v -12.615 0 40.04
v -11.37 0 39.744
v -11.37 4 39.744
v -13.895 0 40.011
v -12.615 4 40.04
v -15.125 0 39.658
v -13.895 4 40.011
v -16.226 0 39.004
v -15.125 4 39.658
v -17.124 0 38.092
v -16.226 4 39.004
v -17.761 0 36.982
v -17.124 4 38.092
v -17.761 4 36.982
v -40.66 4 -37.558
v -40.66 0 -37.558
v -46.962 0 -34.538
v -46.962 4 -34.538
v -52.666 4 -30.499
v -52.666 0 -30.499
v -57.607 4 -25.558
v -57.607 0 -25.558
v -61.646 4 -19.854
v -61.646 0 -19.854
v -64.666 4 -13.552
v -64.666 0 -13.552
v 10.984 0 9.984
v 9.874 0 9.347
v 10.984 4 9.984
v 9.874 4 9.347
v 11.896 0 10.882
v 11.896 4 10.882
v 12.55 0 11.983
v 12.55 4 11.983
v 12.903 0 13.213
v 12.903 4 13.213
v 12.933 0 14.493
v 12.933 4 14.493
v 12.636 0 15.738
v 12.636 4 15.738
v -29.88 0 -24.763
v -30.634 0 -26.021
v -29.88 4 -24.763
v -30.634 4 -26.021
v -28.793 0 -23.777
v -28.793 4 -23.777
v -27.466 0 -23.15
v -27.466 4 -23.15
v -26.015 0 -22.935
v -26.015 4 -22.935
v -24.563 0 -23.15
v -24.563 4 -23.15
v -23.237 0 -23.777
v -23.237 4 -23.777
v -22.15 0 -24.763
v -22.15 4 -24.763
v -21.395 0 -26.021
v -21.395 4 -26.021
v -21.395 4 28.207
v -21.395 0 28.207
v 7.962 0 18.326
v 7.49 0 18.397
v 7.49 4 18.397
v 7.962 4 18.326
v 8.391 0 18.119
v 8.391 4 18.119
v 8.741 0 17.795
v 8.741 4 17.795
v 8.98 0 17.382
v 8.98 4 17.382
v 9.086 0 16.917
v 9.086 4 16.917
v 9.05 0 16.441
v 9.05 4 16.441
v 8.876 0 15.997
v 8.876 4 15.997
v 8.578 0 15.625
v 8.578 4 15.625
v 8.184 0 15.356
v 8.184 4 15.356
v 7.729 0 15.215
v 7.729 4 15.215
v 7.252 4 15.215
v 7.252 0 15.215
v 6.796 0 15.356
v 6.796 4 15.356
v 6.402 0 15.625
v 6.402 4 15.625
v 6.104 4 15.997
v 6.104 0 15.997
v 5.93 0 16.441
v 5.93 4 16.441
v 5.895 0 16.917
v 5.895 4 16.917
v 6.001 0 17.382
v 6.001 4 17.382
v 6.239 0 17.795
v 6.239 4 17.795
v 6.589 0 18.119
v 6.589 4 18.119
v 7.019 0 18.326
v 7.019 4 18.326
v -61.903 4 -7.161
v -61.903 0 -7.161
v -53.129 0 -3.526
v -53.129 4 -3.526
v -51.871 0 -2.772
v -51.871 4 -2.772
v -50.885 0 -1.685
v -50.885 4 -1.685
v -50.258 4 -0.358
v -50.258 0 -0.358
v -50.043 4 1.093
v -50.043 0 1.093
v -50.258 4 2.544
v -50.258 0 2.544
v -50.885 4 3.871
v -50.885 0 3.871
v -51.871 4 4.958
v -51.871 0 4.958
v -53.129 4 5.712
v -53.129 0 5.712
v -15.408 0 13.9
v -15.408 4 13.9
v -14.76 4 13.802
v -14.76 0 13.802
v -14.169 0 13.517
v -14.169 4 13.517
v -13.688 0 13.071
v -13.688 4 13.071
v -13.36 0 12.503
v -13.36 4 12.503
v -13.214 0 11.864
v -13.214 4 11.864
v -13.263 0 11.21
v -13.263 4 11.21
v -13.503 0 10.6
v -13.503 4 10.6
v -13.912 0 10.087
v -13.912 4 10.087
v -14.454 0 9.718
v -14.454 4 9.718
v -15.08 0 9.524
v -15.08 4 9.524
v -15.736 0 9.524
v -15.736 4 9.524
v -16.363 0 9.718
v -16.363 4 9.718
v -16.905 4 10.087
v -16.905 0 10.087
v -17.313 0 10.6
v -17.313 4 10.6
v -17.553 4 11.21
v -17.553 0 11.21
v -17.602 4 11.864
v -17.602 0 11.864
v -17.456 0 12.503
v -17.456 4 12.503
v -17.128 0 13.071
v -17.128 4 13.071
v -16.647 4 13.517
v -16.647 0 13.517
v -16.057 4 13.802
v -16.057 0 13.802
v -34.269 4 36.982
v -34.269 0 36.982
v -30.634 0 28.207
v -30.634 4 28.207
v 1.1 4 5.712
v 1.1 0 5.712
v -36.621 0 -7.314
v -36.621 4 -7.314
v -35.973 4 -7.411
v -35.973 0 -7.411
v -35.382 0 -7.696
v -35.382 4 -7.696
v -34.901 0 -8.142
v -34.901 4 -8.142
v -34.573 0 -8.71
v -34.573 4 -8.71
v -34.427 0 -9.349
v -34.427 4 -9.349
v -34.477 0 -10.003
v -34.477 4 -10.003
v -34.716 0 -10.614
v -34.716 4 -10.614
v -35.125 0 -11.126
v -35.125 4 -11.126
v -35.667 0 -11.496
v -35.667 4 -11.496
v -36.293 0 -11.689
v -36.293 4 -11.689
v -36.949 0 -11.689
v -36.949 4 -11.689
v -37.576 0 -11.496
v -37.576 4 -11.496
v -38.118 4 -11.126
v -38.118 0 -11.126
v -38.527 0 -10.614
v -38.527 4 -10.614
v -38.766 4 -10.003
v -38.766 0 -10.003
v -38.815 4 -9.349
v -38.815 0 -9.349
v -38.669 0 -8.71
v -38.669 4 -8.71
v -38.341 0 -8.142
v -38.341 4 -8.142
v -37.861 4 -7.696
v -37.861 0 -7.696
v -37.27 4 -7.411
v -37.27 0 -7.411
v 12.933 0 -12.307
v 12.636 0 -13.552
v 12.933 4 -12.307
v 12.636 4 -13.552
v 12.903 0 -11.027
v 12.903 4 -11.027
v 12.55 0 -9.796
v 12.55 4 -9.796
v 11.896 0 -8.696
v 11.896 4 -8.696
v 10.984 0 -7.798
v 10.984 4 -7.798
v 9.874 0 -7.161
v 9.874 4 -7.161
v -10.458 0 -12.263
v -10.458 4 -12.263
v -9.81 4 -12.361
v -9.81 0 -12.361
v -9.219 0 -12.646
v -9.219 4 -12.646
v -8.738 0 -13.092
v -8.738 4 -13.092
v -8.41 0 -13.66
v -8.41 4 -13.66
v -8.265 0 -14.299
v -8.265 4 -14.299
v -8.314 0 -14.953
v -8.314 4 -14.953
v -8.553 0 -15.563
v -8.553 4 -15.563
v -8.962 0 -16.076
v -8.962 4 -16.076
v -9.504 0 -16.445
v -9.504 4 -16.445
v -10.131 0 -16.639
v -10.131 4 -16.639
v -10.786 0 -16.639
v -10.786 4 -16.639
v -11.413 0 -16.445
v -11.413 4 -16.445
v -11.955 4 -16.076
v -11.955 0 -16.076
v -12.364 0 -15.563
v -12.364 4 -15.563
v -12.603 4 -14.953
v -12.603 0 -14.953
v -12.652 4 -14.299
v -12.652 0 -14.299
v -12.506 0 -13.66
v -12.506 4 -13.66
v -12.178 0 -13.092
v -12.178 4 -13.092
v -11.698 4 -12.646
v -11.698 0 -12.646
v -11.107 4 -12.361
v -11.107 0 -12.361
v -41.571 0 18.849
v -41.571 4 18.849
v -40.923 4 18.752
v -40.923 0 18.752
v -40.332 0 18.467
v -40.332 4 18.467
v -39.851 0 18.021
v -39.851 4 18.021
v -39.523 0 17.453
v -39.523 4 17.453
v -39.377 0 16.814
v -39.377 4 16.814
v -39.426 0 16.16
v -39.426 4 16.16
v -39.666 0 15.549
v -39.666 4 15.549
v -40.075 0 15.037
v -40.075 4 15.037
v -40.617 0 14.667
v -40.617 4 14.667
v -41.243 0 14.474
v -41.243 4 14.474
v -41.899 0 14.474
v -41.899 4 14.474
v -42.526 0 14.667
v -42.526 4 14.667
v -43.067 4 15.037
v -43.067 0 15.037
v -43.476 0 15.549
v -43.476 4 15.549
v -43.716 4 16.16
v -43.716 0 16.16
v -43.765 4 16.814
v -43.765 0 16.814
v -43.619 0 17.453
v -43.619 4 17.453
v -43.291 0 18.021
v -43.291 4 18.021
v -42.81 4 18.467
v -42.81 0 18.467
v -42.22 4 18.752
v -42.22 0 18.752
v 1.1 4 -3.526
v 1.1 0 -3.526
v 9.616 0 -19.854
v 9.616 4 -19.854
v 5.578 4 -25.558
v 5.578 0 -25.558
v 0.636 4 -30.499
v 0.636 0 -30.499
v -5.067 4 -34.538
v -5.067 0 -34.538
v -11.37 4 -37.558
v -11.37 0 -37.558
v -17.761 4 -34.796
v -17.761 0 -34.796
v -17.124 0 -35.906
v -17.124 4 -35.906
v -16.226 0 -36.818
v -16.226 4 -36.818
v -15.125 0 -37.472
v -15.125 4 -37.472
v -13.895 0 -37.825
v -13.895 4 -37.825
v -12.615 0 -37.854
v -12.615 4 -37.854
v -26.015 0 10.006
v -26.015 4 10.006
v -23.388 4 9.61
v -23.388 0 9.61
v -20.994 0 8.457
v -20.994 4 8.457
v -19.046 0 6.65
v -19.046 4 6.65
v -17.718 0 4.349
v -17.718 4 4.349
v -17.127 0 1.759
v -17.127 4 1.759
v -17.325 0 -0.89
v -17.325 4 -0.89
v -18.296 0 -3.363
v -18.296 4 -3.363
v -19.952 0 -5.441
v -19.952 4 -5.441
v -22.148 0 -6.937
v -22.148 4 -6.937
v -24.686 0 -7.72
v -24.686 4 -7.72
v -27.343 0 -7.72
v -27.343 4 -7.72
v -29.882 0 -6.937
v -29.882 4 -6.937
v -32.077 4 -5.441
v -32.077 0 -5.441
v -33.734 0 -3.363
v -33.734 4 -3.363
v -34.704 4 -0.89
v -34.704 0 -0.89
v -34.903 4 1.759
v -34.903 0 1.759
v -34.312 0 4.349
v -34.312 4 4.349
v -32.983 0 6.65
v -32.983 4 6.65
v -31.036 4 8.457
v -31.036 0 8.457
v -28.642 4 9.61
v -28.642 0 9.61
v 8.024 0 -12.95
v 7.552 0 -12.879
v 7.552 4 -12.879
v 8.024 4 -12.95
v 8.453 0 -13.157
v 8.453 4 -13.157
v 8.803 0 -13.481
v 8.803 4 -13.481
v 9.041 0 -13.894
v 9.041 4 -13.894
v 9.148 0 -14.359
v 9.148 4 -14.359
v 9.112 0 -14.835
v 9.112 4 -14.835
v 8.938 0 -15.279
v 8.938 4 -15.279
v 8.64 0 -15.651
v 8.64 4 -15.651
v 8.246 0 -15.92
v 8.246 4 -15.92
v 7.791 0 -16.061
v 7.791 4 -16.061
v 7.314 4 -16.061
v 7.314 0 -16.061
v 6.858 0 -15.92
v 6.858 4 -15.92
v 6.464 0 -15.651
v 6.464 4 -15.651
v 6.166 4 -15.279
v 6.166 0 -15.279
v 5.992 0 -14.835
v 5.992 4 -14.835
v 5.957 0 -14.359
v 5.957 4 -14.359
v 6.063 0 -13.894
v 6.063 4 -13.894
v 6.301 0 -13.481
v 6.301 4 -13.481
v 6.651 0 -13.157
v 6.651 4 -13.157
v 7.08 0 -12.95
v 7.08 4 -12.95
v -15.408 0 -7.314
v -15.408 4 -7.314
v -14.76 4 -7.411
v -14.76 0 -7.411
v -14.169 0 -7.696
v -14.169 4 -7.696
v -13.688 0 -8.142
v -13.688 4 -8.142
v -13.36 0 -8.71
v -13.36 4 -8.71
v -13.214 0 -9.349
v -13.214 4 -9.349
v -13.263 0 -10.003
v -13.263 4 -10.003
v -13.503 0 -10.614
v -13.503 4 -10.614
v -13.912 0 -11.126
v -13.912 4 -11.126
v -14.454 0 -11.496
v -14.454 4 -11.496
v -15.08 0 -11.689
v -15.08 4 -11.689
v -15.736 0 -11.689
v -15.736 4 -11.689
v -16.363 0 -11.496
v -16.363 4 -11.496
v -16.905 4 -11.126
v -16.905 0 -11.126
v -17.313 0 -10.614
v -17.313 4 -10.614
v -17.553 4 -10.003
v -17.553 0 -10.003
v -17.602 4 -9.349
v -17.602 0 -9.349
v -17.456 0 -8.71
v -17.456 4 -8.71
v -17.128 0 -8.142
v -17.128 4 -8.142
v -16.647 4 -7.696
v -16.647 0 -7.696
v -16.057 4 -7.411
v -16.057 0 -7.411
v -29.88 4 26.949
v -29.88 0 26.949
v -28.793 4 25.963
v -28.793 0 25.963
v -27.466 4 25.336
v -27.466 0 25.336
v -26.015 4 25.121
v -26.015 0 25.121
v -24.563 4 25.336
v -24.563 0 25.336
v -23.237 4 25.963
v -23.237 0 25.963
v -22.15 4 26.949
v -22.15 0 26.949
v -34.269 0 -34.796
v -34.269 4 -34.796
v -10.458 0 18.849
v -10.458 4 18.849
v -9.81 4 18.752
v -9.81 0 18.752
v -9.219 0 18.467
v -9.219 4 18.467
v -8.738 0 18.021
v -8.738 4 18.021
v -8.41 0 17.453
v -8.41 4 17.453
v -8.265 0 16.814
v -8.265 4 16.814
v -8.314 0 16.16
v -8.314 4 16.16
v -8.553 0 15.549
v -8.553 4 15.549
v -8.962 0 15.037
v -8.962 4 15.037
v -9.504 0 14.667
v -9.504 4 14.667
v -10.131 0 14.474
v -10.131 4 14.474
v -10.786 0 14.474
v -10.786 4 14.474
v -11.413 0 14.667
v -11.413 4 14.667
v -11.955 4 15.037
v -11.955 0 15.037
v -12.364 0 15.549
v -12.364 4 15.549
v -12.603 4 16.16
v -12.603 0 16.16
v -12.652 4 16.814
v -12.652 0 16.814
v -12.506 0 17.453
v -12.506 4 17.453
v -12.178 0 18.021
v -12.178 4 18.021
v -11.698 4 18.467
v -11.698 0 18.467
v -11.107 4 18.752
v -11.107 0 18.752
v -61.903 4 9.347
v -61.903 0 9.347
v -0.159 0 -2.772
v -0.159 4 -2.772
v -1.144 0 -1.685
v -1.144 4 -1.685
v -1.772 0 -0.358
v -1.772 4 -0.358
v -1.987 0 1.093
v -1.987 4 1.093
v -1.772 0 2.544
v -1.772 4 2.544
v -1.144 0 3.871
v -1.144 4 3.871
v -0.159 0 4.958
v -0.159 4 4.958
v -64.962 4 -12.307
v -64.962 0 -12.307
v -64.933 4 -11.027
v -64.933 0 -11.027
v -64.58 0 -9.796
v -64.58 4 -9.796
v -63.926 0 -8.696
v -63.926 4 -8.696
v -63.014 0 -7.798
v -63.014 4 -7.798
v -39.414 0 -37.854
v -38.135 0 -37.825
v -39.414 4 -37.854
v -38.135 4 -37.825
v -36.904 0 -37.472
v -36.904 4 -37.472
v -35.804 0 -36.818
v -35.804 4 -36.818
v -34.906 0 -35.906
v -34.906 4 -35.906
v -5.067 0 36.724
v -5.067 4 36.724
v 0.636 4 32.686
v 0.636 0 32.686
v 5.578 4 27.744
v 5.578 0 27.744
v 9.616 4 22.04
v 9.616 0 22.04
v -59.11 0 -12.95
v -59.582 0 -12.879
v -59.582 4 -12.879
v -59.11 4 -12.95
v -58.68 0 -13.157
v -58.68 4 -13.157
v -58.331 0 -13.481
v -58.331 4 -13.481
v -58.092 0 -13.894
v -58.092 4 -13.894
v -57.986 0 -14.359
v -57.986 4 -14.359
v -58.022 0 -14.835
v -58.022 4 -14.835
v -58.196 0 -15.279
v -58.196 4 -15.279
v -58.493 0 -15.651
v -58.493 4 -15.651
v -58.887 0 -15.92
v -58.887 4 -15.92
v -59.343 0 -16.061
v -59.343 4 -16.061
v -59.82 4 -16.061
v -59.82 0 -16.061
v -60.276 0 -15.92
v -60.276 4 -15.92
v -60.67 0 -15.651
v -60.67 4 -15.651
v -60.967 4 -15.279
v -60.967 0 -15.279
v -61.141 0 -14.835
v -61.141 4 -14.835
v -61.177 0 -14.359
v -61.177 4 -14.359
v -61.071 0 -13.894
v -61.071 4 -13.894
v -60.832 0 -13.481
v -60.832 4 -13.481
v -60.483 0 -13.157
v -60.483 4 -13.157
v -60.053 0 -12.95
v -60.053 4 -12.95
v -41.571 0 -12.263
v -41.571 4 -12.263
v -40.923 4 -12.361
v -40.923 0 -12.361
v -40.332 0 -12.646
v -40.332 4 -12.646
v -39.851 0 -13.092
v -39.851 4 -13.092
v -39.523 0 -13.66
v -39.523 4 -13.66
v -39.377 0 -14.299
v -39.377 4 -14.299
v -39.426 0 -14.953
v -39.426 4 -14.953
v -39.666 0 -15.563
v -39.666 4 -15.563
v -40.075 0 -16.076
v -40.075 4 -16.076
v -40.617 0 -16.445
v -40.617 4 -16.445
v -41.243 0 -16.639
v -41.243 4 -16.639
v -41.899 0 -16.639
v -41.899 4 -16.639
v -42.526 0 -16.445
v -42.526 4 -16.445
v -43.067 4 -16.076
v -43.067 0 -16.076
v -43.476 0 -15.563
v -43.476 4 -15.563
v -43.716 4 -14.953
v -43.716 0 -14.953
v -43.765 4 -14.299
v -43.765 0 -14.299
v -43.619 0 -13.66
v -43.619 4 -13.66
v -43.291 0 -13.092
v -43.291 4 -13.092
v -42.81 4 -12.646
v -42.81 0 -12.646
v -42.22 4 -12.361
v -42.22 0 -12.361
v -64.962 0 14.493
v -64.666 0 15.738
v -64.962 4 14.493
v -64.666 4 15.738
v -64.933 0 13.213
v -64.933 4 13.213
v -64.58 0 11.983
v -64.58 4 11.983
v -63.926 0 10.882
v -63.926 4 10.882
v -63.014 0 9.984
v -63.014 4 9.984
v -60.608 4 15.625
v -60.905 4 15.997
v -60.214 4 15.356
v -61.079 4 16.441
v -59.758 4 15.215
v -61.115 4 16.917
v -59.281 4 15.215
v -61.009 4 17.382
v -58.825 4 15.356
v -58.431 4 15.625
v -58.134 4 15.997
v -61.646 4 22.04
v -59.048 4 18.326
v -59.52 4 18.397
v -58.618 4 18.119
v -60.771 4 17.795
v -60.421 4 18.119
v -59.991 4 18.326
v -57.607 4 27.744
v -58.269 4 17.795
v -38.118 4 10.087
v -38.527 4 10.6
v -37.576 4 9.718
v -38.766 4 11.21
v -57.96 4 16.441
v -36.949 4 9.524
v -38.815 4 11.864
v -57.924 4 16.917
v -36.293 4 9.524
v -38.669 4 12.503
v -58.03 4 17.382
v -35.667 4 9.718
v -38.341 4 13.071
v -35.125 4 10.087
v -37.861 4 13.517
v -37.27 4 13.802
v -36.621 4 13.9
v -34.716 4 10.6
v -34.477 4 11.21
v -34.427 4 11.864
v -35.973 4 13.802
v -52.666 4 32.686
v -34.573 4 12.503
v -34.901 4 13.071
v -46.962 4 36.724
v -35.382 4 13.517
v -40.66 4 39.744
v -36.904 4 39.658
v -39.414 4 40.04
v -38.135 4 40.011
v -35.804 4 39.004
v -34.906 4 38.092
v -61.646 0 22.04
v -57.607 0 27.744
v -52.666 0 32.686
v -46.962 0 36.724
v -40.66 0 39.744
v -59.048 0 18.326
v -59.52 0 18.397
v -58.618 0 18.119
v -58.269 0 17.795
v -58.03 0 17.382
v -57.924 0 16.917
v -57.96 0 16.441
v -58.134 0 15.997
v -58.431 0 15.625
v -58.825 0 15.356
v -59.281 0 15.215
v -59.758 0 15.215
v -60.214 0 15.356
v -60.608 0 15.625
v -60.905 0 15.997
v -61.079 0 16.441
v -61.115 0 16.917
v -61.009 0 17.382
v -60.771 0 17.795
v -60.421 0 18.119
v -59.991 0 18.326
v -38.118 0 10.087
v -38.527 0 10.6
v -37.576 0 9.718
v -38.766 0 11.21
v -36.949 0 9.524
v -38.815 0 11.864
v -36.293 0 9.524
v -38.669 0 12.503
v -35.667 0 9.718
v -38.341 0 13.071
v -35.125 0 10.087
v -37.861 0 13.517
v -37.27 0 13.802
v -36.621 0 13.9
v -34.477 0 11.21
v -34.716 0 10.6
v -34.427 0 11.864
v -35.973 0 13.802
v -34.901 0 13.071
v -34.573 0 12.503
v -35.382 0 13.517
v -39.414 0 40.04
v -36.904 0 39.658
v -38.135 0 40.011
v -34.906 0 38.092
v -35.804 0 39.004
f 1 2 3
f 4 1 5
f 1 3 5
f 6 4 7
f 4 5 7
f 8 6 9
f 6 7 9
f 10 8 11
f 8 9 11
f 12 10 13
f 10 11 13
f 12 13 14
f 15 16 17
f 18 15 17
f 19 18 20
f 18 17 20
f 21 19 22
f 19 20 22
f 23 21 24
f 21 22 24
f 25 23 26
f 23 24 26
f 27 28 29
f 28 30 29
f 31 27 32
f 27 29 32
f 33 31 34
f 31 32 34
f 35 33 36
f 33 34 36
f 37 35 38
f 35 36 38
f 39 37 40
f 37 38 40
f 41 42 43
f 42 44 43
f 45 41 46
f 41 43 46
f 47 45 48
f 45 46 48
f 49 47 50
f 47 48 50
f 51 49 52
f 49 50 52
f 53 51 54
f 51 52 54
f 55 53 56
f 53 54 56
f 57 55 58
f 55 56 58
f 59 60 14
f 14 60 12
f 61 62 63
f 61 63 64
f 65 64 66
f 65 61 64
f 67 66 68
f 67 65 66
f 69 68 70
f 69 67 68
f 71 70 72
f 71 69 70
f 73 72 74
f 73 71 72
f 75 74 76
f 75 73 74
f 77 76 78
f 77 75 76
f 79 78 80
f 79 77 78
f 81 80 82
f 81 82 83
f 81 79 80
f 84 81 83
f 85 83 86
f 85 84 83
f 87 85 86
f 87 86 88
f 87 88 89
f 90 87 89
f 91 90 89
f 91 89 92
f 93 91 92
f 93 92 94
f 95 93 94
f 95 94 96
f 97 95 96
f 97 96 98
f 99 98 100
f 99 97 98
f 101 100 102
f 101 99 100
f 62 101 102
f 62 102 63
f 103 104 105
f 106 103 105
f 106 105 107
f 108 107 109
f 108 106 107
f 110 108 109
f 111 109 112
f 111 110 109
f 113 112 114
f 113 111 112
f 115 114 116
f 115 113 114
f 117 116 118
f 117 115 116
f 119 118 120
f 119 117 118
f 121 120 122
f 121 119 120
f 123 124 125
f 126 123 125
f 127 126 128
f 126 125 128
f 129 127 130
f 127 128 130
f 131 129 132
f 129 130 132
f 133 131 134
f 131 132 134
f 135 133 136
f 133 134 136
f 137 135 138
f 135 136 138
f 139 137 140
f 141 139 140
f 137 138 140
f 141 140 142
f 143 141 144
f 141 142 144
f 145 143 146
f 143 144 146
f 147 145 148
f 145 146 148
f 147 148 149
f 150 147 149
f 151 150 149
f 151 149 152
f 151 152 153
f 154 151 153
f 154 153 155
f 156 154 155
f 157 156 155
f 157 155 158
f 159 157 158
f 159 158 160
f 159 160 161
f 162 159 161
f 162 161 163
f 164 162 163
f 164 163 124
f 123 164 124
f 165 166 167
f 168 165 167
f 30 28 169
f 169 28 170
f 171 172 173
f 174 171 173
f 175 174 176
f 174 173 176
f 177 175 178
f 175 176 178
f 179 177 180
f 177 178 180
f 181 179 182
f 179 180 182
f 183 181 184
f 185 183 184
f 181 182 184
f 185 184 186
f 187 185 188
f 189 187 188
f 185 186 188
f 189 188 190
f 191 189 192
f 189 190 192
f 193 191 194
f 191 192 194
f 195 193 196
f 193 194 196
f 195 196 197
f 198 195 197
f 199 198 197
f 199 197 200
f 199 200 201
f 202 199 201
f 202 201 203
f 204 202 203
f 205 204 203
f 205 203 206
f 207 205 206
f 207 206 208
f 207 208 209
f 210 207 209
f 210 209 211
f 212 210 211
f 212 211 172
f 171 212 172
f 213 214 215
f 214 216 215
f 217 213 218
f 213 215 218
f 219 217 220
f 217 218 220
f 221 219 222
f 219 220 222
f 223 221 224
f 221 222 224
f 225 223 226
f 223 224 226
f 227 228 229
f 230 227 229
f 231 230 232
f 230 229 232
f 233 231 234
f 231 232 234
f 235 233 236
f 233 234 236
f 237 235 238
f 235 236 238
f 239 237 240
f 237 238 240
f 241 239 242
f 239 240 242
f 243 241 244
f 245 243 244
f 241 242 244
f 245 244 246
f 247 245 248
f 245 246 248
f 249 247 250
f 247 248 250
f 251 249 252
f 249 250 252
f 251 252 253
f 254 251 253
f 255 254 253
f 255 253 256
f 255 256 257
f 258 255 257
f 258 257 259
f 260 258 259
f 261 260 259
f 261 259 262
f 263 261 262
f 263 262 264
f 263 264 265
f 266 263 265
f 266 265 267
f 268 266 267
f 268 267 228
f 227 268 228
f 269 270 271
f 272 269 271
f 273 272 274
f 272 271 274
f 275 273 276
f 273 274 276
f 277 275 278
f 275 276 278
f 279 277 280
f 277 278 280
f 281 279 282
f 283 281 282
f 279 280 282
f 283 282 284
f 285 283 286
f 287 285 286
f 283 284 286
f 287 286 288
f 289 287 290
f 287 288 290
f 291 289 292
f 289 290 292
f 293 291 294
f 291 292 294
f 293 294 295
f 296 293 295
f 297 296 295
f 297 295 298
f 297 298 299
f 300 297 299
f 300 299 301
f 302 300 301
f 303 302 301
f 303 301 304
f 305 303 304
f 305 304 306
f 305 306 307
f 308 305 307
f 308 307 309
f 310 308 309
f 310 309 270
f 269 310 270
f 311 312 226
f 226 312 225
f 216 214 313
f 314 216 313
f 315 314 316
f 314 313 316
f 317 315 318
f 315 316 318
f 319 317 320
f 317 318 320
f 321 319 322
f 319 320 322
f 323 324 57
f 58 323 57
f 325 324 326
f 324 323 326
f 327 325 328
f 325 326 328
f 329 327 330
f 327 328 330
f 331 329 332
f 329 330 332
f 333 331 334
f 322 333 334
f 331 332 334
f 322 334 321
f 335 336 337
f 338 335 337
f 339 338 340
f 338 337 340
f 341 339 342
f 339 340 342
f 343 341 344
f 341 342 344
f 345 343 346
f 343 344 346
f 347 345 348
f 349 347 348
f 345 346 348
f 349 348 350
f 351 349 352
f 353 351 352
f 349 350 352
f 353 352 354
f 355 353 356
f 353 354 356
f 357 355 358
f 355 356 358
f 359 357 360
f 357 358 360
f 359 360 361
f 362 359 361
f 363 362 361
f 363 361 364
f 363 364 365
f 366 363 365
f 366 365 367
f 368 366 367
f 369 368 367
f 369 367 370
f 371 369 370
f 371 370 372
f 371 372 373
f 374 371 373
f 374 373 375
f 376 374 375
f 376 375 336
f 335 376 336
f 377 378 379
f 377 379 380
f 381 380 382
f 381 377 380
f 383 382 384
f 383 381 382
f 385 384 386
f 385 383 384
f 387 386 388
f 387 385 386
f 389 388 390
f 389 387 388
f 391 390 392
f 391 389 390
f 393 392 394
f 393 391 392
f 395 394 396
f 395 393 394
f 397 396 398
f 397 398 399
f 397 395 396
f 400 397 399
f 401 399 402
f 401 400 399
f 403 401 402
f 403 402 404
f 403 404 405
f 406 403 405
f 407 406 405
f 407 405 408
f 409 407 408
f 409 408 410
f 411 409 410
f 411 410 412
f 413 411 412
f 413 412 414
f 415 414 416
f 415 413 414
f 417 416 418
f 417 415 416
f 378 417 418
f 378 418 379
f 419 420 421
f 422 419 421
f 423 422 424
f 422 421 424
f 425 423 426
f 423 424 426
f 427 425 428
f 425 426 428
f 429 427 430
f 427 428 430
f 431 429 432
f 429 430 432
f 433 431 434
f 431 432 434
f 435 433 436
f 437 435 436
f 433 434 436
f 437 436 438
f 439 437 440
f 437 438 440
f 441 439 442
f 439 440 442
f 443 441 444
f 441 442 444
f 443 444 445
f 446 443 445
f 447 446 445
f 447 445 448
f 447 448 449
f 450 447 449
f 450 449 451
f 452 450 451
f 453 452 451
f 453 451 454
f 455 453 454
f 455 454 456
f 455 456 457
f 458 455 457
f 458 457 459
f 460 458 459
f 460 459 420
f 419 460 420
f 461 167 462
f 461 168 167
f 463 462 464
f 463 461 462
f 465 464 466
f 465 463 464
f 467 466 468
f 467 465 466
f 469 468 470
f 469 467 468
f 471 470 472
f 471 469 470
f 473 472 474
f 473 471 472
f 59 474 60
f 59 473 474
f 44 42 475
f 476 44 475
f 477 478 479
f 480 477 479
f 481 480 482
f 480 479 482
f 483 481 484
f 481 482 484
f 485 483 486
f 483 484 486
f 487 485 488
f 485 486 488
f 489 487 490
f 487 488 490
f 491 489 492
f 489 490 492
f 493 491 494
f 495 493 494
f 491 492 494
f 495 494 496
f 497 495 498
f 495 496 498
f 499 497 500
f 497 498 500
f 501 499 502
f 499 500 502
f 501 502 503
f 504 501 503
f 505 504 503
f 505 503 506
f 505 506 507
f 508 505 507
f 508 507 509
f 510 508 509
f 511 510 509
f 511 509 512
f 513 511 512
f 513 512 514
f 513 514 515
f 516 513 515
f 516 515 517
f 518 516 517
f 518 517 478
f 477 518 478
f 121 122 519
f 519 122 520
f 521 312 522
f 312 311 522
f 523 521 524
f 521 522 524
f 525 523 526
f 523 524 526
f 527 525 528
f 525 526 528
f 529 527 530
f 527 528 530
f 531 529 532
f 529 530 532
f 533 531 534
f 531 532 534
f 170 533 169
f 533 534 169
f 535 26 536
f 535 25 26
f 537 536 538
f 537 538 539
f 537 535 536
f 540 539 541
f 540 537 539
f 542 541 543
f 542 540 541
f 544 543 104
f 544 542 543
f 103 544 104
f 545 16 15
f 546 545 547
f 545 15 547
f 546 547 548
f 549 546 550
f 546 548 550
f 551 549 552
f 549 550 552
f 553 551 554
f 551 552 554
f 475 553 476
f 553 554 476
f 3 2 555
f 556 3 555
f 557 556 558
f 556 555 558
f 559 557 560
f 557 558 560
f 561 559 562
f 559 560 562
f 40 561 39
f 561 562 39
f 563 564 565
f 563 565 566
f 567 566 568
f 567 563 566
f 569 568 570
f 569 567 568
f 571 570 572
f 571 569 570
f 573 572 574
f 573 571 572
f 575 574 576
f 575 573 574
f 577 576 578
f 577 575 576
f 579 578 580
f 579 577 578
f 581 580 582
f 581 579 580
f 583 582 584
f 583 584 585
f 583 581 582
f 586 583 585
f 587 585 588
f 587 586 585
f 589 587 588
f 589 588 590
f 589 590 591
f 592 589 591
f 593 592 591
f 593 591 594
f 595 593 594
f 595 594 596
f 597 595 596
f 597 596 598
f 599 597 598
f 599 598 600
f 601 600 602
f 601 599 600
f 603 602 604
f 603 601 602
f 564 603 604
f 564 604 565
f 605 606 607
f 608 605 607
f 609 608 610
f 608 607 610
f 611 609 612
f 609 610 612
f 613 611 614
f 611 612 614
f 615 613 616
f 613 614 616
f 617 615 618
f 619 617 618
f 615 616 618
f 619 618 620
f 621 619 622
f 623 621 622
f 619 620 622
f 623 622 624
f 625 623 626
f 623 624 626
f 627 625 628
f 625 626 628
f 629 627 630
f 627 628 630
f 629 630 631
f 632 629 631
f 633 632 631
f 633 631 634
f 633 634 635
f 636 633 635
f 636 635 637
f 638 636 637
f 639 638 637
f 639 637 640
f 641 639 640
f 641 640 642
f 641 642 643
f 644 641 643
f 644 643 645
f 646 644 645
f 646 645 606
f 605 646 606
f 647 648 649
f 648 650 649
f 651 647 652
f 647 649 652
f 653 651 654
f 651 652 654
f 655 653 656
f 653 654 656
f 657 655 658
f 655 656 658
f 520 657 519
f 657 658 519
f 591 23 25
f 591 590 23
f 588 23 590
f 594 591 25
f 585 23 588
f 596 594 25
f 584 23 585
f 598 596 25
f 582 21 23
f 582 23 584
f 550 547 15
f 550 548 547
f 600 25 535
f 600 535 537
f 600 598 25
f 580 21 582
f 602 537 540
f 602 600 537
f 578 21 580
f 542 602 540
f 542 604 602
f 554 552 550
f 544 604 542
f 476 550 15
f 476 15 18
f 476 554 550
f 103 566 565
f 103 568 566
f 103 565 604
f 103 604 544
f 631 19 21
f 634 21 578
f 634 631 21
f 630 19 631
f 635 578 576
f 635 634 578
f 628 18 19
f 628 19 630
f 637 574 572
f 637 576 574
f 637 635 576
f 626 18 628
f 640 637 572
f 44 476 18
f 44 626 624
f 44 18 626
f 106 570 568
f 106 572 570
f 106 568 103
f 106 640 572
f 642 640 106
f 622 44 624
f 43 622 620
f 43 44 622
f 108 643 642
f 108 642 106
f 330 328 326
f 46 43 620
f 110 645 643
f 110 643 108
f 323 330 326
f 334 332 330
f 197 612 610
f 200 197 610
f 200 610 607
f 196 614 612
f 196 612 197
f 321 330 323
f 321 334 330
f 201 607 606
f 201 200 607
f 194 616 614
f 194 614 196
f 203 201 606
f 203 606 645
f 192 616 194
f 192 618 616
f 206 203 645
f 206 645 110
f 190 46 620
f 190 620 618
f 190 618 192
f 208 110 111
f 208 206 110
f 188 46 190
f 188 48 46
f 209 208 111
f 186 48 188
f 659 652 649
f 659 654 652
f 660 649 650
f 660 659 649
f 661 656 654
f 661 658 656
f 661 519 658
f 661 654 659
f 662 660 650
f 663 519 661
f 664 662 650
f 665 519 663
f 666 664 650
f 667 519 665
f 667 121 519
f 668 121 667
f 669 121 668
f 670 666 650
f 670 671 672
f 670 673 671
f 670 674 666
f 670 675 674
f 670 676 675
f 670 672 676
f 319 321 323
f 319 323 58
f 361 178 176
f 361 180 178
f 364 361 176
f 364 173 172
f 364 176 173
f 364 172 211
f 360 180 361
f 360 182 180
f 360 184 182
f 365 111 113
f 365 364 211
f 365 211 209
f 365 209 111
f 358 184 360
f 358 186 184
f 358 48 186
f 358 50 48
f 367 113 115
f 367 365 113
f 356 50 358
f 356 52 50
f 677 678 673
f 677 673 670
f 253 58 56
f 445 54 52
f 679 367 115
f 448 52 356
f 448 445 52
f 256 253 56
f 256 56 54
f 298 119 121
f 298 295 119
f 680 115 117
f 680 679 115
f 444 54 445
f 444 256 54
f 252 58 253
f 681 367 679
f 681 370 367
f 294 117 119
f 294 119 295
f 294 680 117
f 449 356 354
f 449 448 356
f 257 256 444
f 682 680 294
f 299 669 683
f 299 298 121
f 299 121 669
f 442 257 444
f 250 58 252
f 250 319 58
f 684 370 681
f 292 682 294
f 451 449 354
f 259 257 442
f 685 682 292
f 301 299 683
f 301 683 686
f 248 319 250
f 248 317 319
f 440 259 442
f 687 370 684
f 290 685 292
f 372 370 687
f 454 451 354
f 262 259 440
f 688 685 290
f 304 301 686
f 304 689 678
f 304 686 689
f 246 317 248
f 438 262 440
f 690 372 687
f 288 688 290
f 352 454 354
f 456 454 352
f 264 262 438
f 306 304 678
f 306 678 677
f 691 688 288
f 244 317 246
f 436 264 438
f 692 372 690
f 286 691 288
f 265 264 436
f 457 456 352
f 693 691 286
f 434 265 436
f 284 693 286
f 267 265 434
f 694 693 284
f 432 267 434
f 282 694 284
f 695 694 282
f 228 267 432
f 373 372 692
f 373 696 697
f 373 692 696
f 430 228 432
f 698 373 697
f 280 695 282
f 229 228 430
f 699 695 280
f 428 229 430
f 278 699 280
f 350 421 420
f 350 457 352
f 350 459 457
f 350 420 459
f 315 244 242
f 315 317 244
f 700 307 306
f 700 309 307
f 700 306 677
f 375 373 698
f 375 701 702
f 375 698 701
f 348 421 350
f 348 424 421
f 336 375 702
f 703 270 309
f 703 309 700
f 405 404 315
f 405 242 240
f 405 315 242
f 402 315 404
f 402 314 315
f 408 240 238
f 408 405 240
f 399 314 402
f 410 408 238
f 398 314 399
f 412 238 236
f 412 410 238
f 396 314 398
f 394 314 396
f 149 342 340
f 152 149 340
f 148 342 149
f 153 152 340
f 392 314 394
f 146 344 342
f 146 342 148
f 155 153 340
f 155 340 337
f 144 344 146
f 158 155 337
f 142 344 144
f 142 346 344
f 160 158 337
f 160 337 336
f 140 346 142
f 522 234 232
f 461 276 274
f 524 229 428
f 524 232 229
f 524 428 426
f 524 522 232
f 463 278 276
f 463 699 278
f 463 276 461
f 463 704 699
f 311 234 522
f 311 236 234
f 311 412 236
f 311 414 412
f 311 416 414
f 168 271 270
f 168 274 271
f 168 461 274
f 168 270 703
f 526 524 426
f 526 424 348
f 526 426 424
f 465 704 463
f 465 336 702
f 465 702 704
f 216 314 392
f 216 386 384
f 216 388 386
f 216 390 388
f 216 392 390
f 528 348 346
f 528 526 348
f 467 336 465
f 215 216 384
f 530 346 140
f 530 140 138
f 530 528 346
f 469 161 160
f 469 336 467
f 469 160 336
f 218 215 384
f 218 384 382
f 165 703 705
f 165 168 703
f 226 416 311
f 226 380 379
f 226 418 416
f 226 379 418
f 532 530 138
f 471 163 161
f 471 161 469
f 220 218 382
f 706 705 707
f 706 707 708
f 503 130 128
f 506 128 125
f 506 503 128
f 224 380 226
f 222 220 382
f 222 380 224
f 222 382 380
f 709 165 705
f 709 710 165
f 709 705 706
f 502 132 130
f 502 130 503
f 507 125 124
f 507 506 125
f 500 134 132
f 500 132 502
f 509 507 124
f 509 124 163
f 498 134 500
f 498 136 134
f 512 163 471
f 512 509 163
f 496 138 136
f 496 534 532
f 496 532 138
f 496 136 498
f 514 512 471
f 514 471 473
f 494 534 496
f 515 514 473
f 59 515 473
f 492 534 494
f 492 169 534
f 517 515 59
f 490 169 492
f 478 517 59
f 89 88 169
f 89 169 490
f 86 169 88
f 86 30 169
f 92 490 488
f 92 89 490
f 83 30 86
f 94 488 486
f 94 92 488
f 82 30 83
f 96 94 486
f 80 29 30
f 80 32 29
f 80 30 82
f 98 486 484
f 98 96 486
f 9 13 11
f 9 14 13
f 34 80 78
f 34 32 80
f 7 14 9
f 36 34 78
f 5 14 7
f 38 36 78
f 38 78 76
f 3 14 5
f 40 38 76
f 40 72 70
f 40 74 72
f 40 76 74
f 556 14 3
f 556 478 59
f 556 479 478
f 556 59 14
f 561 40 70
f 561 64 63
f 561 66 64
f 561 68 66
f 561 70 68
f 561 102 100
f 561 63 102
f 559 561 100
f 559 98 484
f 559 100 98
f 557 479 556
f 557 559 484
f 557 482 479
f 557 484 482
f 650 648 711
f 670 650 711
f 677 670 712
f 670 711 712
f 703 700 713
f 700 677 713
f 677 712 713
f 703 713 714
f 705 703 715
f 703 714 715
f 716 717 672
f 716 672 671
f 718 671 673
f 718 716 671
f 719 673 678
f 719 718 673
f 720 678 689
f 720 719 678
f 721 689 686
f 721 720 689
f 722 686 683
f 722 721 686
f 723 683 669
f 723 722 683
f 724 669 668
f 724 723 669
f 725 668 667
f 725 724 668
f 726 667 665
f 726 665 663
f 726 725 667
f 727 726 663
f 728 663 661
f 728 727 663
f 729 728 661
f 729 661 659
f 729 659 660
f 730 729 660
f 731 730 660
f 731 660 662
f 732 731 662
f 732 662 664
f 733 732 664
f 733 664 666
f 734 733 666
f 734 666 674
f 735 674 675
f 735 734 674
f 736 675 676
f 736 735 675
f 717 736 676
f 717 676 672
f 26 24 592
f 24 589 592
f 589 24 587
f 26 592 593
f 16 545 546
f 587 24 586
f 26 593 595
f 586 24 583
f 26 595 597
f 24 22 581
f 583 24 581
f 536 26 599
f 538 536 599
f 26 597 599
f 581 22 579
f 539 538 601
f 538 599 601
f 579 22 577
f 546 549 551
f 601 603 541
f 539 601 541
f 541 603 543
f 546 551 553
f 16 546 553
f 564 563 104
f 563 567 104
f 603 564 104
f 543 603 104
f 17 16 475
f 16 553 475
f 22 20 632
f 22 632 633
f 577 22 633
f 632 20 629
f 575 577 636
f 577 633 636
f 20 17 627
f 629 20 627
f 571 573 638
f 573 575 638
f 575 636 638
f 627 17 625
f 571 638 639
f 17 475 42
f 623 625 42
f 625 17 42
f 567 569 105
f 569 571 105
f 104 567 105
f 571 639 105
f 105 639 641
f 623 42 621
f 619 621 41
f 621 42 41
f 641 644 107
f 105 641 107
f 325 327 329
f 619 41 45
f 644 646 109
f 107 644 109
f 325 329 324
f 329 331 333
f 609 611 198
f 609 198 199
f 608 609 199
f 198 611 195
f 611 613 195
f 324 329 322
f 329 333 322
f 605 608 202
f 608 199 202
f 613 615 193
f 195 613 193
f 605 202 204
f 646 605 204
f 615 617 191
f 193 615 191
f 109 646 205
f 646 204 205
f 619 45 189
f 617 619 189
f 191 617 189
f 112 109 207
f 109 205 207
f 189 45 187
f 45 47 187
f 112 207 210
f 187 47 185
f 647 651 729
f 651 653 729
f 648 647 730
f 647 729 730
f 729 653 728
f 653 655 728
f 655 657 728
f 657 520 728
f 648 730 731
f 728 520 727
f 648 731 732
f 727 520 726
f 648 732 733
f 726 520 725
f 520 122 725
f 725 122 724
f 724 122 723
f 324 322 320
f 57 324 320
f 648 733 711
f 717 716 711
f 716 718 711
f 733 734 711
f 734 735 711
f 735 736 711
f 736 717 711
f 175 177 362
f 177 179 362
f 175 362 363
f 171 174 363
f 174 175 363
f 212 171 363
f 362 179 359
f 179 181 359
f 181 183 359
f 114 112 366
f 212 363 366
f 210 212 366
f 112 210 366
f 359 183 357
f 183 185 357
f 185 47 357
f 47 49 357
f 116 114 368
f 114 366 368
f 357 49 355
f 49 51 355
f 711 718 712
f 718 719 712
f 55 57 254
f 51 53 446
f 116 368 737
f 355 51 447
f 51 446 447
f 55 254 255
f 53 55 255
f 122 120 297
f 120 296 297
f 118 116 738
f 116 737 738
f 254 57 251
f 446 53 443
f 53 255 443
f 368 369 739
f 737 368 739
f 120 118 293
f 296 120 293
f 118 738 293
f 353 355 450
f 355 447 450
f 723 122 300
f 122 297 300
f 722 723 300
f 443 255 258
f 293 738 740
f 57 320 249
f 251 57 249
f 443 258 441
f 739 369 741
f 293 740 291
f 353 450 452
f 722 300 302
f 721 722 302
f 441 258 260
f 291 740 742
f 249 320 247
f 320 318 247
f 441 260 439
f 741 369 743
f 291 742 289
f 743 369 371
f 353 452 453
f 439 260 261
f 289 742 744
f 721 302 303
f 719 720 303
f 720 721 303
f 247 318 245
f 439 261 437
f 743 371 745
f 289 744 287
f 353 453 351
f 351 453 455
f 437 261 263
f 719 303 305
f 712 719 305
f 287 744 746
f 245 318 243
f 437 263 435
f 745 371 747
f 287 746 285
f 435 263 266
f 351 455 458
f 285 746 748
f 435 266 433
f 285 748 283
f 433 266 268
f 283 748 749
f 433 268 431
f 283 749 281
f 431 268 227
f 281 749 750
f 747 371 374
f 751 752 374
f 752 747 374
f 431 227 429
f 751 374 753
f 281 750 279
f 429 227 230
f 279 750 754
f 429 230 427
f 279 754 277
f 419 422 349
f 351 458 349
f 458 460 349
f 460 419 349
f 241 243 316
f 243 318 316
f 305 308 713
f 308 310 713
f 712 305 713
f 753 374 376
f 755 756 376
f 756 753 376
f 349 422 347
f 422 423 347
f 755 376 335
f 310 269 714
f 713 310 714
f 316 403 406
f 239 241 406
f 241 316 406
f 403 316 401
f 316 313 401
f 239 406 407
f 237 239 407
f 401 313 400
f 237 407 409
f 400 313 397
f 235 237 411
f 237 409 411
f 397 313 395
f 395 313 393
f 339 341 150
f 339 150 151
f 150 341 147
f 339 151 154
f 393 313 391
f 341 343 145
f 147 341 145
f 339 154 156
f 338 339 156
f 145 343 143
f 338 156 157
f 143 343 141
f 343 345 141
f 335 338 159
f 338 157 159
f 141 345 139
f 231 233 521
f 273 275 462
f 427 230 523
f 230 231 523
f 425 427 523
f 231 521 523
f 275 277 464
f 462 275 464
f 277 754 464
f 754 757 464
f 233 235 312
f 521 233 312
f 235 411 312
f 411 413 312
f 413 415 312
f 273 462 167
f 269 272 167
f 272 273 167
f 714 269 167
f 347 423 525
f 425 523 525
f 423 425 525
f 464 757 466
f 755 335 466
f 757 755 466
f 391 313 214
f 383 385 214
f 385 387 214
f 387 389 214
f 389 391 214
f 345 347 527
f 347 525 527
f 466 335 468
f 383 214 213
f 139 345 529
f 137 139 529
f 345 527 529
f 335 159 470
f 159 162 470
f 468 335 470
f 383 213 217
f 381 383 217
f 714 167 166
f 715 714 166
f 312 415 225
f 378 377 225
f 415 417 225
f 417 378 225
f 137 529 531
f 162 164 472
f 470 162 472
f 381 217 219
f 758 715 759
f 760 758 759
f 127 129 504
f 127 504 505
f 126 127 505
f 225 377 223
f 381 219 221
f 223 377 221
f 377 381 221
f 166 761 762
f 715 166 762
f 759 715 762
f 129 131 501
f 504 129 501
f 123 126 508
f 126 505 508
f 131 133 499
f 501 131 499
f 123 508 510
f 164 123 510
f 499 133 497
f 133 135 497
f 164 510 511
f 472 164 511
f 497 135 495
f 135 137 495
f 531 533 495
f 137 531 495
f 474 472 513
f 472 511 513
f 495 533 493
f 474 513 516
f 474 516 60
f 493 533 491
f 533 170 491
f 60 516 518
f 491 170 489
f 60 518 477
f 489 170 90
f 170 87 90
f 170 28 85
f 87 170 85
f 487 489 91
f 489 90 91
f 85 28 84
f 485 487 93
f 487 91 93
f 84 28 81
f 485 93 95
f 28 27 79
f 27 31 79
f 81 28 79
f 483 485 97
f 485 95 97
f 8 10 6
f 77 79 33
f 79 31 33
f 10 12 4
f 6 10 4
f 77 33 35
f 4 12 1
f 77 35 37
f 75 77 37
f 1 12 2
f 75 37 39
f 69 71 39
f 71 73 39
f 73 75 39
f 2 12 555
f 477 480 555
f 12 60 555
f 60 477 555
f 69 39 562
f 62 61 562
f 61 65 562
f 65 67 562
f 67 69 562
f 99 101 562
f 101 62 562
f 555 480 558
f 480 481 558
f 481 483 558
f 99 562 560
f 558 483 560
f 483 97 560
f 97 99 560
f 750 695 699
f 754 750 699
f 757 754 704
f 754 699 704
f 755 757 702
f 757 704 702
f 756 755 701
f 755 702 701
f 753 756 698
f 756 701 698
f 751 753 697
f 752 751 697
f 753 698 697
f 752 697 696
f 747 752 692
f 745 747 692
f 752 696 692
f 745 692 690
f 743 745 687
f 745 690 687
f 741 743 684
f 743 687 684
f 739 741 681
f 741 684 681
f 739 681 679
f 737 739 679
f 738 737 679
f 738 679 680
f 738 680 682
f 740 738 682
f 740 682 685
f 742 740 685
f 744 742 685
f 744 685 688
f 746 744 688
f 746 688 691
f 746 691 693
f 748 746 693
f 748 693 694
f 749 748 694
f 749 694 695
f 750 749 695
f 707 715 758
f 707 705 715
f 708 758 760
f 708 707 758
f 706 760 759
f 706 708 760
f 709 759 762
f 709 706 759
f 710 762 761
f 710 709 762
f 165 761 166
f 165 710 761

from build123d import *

# Parameters (mm, degrees)
SKETCH1_R                = 41.332242953
SKETCH1_R_2              = 1.6
BOSS_EXTRUDE1_DEPTH      = 4
SKETCH2_R                = 8.913017029
SKETCH2_R_2              = 2.2
CUT_EXTRUDE1_DEPTH       = 12
CUT_EXTRUDE2_START       = -12
CUT_EXTRUDE2_DEPTH       = 12
FILLET1_R                = 5
CIRPATTERN1_COUNT        = 4
FILLET1_OF_CIRPATTERN1_R = 5


with BuildPart() as part:
    # Sketch1 → Boss-Extrude1 (new body)
    with BuildSketch(Plane(origin=(0, 0, 0), x_dir=(1, 0, 0), z_dir=(0, 1, 0))):
        with Locations(Location((-26.014745027, -1.093056514, 0), (0, 0, 270))):
            Circle(SKETCH1_R)
        with Locations(Location((-59.58153309, 14.478552308, 0), (0, 0, 270))):
            Circle(SKETCH1_R_2, mode=Mode.SUBTRACT)
        with Locations(Location((-59.519604899, -16.797470769, 0), (0, 0, 270))):
            Circle(SKETCH1_R_2, mode=Mode.SUBTRACT)
        with Locations(Location((7.490114845, -16.797470769, 0), (0, 0, 270))):
            Circle(SKETCH1_R_2, mode=Mode.SUBTRACT)
        with Locations(Location((7.552043035, 14.478552308, 0), (0, 0, 270))):
            Circle(SKETCH1_R_2, mode=Mode.SUBTRACT)
    extrude(amount=BOSS_EXTRUDE1_DEPTH)

    # Sketch2 → Cut-Extrude1 (cut)
    with BuildSketch(Plane(origin=(0, 4, 0), x_dir=(1, 0, 0), z_dir=(0, 1, 0))):
        with Locations(Location((-26.014745027, -1.093056514, 0), (0, 0, 270))):
            Circle(SKETCH2_R)
        with Locations(Location((-15.408143309, 9.513545204, 0), (0, 0, 270))):
            Circle(SKETCH2_R_2)
        with Locations(Location((-10.458395841, 14.463292672, 0), (0, 0, 270))):
            Circle(SKETCH2_R_2)
        with Locations(Location((-36.621346745, 9.513545204, 0), (0, 0, 270))):
            Circle(SKETCH2_R_2)
        with Locations(Location((-41.571094213, 14.463292672, 0), (0, 0, 270))):
            Circle(SKETCH2_R_2)
        with Locations(Location((-36.621346745, -11.699658232, 0), (0, 0, 270))):
            Circle(SKETCH2_R_2)
        with Locations(Location((-41.571094213, -16.6494057, 0), (0, 0, 270))):
            Circle(SKETCH2_R_2)
        with Locations(Location((-15.408143309, -11.699658232, 0), (0, 0, 270))):
            Circle(SKETCH2_R_2)
        with Locations(Location((-10.458395841, -16.6494057, 0), (0, 0, 270))):
            Circle(SKETCH2_R_2)
    extrude(amount=-CUT_EXTRUDE1_DEPTH, mode=Mode.SUBTRACT)

    # Sketch4 → Cut-Extrude2 (cut)
    with BuildSketch(Plane(origin=(0, 4, 0), x_dir=(1, 0, 0), z_dir=(0, 1, 0)).offset(CUT_EXTRUDE2_START)):
        with BuildLine():
            Line((-66.119037909, 8.906943486), (-41.976902285, -1.093056514))
            Line((-41.976902285, -1.093056514), (-66.119037909, -11.093056514))
            ThreePointArc((-66.119037909, -11.093056514), (-67.34698798, -1.093056514), (-66.119037909, 8.906943486))
        make_face()
    cut_extrude2 = extrude(amount=CUT_EXTRUDE2_DEPTH, mode=Mode.SUBTRACT)

    # Fillet1
    fillet1_edges = [part.edges().sort_by_distance(p)[0] for p in [
        (-66.119037909, 2, 11.093056514),
        (-66.119037909, 2, -8.906943486),
        (-41.976902285, 2, 1.093056514),
    ]]
    fillet(fillet1_edges, radius=FILLET1_R)

    # CirPattern1: Cut-Extrude2 ×4 about axis
    cirpattern1_axis = Axis((-26.014745027, 0, 1.093056514), (0, 1, 0))
    for i in range(1, CIRPATTERN1_COUNT):
        add(cut_extrude2.rotate(cirpattern1_axis, i * 360 / CIRPATTERN1_COUNT), mode=Mode.SUBTRACT)

    # Fillet1 of CirPattern1
    fillet1_of_cirpattern1_edges = [part.edges().sort_by_distance(p)[0] for p in [
        (-16.014745027, 2, 41.197349395),
        (-36.014745027, 2, 41.197349395),
        (-26.014745027, 2, 17.055213772),
        (14.089547854, 2, -8.906943486),
        (14.089547854, 2, 11.093056514),
        (-10.052587769, 2, 1.093056514),
        (-36.014745027, 2, -39.011236368),
        (-16.014745027, 2, -39.011236368),
        (-26.014745027, 2, -14.869100744),
    ]]
    fillet(fillet1_of_cirpattern1_edges, radius=FILLET1_OF_CIRPATTERN1_R)


solid = part.part
